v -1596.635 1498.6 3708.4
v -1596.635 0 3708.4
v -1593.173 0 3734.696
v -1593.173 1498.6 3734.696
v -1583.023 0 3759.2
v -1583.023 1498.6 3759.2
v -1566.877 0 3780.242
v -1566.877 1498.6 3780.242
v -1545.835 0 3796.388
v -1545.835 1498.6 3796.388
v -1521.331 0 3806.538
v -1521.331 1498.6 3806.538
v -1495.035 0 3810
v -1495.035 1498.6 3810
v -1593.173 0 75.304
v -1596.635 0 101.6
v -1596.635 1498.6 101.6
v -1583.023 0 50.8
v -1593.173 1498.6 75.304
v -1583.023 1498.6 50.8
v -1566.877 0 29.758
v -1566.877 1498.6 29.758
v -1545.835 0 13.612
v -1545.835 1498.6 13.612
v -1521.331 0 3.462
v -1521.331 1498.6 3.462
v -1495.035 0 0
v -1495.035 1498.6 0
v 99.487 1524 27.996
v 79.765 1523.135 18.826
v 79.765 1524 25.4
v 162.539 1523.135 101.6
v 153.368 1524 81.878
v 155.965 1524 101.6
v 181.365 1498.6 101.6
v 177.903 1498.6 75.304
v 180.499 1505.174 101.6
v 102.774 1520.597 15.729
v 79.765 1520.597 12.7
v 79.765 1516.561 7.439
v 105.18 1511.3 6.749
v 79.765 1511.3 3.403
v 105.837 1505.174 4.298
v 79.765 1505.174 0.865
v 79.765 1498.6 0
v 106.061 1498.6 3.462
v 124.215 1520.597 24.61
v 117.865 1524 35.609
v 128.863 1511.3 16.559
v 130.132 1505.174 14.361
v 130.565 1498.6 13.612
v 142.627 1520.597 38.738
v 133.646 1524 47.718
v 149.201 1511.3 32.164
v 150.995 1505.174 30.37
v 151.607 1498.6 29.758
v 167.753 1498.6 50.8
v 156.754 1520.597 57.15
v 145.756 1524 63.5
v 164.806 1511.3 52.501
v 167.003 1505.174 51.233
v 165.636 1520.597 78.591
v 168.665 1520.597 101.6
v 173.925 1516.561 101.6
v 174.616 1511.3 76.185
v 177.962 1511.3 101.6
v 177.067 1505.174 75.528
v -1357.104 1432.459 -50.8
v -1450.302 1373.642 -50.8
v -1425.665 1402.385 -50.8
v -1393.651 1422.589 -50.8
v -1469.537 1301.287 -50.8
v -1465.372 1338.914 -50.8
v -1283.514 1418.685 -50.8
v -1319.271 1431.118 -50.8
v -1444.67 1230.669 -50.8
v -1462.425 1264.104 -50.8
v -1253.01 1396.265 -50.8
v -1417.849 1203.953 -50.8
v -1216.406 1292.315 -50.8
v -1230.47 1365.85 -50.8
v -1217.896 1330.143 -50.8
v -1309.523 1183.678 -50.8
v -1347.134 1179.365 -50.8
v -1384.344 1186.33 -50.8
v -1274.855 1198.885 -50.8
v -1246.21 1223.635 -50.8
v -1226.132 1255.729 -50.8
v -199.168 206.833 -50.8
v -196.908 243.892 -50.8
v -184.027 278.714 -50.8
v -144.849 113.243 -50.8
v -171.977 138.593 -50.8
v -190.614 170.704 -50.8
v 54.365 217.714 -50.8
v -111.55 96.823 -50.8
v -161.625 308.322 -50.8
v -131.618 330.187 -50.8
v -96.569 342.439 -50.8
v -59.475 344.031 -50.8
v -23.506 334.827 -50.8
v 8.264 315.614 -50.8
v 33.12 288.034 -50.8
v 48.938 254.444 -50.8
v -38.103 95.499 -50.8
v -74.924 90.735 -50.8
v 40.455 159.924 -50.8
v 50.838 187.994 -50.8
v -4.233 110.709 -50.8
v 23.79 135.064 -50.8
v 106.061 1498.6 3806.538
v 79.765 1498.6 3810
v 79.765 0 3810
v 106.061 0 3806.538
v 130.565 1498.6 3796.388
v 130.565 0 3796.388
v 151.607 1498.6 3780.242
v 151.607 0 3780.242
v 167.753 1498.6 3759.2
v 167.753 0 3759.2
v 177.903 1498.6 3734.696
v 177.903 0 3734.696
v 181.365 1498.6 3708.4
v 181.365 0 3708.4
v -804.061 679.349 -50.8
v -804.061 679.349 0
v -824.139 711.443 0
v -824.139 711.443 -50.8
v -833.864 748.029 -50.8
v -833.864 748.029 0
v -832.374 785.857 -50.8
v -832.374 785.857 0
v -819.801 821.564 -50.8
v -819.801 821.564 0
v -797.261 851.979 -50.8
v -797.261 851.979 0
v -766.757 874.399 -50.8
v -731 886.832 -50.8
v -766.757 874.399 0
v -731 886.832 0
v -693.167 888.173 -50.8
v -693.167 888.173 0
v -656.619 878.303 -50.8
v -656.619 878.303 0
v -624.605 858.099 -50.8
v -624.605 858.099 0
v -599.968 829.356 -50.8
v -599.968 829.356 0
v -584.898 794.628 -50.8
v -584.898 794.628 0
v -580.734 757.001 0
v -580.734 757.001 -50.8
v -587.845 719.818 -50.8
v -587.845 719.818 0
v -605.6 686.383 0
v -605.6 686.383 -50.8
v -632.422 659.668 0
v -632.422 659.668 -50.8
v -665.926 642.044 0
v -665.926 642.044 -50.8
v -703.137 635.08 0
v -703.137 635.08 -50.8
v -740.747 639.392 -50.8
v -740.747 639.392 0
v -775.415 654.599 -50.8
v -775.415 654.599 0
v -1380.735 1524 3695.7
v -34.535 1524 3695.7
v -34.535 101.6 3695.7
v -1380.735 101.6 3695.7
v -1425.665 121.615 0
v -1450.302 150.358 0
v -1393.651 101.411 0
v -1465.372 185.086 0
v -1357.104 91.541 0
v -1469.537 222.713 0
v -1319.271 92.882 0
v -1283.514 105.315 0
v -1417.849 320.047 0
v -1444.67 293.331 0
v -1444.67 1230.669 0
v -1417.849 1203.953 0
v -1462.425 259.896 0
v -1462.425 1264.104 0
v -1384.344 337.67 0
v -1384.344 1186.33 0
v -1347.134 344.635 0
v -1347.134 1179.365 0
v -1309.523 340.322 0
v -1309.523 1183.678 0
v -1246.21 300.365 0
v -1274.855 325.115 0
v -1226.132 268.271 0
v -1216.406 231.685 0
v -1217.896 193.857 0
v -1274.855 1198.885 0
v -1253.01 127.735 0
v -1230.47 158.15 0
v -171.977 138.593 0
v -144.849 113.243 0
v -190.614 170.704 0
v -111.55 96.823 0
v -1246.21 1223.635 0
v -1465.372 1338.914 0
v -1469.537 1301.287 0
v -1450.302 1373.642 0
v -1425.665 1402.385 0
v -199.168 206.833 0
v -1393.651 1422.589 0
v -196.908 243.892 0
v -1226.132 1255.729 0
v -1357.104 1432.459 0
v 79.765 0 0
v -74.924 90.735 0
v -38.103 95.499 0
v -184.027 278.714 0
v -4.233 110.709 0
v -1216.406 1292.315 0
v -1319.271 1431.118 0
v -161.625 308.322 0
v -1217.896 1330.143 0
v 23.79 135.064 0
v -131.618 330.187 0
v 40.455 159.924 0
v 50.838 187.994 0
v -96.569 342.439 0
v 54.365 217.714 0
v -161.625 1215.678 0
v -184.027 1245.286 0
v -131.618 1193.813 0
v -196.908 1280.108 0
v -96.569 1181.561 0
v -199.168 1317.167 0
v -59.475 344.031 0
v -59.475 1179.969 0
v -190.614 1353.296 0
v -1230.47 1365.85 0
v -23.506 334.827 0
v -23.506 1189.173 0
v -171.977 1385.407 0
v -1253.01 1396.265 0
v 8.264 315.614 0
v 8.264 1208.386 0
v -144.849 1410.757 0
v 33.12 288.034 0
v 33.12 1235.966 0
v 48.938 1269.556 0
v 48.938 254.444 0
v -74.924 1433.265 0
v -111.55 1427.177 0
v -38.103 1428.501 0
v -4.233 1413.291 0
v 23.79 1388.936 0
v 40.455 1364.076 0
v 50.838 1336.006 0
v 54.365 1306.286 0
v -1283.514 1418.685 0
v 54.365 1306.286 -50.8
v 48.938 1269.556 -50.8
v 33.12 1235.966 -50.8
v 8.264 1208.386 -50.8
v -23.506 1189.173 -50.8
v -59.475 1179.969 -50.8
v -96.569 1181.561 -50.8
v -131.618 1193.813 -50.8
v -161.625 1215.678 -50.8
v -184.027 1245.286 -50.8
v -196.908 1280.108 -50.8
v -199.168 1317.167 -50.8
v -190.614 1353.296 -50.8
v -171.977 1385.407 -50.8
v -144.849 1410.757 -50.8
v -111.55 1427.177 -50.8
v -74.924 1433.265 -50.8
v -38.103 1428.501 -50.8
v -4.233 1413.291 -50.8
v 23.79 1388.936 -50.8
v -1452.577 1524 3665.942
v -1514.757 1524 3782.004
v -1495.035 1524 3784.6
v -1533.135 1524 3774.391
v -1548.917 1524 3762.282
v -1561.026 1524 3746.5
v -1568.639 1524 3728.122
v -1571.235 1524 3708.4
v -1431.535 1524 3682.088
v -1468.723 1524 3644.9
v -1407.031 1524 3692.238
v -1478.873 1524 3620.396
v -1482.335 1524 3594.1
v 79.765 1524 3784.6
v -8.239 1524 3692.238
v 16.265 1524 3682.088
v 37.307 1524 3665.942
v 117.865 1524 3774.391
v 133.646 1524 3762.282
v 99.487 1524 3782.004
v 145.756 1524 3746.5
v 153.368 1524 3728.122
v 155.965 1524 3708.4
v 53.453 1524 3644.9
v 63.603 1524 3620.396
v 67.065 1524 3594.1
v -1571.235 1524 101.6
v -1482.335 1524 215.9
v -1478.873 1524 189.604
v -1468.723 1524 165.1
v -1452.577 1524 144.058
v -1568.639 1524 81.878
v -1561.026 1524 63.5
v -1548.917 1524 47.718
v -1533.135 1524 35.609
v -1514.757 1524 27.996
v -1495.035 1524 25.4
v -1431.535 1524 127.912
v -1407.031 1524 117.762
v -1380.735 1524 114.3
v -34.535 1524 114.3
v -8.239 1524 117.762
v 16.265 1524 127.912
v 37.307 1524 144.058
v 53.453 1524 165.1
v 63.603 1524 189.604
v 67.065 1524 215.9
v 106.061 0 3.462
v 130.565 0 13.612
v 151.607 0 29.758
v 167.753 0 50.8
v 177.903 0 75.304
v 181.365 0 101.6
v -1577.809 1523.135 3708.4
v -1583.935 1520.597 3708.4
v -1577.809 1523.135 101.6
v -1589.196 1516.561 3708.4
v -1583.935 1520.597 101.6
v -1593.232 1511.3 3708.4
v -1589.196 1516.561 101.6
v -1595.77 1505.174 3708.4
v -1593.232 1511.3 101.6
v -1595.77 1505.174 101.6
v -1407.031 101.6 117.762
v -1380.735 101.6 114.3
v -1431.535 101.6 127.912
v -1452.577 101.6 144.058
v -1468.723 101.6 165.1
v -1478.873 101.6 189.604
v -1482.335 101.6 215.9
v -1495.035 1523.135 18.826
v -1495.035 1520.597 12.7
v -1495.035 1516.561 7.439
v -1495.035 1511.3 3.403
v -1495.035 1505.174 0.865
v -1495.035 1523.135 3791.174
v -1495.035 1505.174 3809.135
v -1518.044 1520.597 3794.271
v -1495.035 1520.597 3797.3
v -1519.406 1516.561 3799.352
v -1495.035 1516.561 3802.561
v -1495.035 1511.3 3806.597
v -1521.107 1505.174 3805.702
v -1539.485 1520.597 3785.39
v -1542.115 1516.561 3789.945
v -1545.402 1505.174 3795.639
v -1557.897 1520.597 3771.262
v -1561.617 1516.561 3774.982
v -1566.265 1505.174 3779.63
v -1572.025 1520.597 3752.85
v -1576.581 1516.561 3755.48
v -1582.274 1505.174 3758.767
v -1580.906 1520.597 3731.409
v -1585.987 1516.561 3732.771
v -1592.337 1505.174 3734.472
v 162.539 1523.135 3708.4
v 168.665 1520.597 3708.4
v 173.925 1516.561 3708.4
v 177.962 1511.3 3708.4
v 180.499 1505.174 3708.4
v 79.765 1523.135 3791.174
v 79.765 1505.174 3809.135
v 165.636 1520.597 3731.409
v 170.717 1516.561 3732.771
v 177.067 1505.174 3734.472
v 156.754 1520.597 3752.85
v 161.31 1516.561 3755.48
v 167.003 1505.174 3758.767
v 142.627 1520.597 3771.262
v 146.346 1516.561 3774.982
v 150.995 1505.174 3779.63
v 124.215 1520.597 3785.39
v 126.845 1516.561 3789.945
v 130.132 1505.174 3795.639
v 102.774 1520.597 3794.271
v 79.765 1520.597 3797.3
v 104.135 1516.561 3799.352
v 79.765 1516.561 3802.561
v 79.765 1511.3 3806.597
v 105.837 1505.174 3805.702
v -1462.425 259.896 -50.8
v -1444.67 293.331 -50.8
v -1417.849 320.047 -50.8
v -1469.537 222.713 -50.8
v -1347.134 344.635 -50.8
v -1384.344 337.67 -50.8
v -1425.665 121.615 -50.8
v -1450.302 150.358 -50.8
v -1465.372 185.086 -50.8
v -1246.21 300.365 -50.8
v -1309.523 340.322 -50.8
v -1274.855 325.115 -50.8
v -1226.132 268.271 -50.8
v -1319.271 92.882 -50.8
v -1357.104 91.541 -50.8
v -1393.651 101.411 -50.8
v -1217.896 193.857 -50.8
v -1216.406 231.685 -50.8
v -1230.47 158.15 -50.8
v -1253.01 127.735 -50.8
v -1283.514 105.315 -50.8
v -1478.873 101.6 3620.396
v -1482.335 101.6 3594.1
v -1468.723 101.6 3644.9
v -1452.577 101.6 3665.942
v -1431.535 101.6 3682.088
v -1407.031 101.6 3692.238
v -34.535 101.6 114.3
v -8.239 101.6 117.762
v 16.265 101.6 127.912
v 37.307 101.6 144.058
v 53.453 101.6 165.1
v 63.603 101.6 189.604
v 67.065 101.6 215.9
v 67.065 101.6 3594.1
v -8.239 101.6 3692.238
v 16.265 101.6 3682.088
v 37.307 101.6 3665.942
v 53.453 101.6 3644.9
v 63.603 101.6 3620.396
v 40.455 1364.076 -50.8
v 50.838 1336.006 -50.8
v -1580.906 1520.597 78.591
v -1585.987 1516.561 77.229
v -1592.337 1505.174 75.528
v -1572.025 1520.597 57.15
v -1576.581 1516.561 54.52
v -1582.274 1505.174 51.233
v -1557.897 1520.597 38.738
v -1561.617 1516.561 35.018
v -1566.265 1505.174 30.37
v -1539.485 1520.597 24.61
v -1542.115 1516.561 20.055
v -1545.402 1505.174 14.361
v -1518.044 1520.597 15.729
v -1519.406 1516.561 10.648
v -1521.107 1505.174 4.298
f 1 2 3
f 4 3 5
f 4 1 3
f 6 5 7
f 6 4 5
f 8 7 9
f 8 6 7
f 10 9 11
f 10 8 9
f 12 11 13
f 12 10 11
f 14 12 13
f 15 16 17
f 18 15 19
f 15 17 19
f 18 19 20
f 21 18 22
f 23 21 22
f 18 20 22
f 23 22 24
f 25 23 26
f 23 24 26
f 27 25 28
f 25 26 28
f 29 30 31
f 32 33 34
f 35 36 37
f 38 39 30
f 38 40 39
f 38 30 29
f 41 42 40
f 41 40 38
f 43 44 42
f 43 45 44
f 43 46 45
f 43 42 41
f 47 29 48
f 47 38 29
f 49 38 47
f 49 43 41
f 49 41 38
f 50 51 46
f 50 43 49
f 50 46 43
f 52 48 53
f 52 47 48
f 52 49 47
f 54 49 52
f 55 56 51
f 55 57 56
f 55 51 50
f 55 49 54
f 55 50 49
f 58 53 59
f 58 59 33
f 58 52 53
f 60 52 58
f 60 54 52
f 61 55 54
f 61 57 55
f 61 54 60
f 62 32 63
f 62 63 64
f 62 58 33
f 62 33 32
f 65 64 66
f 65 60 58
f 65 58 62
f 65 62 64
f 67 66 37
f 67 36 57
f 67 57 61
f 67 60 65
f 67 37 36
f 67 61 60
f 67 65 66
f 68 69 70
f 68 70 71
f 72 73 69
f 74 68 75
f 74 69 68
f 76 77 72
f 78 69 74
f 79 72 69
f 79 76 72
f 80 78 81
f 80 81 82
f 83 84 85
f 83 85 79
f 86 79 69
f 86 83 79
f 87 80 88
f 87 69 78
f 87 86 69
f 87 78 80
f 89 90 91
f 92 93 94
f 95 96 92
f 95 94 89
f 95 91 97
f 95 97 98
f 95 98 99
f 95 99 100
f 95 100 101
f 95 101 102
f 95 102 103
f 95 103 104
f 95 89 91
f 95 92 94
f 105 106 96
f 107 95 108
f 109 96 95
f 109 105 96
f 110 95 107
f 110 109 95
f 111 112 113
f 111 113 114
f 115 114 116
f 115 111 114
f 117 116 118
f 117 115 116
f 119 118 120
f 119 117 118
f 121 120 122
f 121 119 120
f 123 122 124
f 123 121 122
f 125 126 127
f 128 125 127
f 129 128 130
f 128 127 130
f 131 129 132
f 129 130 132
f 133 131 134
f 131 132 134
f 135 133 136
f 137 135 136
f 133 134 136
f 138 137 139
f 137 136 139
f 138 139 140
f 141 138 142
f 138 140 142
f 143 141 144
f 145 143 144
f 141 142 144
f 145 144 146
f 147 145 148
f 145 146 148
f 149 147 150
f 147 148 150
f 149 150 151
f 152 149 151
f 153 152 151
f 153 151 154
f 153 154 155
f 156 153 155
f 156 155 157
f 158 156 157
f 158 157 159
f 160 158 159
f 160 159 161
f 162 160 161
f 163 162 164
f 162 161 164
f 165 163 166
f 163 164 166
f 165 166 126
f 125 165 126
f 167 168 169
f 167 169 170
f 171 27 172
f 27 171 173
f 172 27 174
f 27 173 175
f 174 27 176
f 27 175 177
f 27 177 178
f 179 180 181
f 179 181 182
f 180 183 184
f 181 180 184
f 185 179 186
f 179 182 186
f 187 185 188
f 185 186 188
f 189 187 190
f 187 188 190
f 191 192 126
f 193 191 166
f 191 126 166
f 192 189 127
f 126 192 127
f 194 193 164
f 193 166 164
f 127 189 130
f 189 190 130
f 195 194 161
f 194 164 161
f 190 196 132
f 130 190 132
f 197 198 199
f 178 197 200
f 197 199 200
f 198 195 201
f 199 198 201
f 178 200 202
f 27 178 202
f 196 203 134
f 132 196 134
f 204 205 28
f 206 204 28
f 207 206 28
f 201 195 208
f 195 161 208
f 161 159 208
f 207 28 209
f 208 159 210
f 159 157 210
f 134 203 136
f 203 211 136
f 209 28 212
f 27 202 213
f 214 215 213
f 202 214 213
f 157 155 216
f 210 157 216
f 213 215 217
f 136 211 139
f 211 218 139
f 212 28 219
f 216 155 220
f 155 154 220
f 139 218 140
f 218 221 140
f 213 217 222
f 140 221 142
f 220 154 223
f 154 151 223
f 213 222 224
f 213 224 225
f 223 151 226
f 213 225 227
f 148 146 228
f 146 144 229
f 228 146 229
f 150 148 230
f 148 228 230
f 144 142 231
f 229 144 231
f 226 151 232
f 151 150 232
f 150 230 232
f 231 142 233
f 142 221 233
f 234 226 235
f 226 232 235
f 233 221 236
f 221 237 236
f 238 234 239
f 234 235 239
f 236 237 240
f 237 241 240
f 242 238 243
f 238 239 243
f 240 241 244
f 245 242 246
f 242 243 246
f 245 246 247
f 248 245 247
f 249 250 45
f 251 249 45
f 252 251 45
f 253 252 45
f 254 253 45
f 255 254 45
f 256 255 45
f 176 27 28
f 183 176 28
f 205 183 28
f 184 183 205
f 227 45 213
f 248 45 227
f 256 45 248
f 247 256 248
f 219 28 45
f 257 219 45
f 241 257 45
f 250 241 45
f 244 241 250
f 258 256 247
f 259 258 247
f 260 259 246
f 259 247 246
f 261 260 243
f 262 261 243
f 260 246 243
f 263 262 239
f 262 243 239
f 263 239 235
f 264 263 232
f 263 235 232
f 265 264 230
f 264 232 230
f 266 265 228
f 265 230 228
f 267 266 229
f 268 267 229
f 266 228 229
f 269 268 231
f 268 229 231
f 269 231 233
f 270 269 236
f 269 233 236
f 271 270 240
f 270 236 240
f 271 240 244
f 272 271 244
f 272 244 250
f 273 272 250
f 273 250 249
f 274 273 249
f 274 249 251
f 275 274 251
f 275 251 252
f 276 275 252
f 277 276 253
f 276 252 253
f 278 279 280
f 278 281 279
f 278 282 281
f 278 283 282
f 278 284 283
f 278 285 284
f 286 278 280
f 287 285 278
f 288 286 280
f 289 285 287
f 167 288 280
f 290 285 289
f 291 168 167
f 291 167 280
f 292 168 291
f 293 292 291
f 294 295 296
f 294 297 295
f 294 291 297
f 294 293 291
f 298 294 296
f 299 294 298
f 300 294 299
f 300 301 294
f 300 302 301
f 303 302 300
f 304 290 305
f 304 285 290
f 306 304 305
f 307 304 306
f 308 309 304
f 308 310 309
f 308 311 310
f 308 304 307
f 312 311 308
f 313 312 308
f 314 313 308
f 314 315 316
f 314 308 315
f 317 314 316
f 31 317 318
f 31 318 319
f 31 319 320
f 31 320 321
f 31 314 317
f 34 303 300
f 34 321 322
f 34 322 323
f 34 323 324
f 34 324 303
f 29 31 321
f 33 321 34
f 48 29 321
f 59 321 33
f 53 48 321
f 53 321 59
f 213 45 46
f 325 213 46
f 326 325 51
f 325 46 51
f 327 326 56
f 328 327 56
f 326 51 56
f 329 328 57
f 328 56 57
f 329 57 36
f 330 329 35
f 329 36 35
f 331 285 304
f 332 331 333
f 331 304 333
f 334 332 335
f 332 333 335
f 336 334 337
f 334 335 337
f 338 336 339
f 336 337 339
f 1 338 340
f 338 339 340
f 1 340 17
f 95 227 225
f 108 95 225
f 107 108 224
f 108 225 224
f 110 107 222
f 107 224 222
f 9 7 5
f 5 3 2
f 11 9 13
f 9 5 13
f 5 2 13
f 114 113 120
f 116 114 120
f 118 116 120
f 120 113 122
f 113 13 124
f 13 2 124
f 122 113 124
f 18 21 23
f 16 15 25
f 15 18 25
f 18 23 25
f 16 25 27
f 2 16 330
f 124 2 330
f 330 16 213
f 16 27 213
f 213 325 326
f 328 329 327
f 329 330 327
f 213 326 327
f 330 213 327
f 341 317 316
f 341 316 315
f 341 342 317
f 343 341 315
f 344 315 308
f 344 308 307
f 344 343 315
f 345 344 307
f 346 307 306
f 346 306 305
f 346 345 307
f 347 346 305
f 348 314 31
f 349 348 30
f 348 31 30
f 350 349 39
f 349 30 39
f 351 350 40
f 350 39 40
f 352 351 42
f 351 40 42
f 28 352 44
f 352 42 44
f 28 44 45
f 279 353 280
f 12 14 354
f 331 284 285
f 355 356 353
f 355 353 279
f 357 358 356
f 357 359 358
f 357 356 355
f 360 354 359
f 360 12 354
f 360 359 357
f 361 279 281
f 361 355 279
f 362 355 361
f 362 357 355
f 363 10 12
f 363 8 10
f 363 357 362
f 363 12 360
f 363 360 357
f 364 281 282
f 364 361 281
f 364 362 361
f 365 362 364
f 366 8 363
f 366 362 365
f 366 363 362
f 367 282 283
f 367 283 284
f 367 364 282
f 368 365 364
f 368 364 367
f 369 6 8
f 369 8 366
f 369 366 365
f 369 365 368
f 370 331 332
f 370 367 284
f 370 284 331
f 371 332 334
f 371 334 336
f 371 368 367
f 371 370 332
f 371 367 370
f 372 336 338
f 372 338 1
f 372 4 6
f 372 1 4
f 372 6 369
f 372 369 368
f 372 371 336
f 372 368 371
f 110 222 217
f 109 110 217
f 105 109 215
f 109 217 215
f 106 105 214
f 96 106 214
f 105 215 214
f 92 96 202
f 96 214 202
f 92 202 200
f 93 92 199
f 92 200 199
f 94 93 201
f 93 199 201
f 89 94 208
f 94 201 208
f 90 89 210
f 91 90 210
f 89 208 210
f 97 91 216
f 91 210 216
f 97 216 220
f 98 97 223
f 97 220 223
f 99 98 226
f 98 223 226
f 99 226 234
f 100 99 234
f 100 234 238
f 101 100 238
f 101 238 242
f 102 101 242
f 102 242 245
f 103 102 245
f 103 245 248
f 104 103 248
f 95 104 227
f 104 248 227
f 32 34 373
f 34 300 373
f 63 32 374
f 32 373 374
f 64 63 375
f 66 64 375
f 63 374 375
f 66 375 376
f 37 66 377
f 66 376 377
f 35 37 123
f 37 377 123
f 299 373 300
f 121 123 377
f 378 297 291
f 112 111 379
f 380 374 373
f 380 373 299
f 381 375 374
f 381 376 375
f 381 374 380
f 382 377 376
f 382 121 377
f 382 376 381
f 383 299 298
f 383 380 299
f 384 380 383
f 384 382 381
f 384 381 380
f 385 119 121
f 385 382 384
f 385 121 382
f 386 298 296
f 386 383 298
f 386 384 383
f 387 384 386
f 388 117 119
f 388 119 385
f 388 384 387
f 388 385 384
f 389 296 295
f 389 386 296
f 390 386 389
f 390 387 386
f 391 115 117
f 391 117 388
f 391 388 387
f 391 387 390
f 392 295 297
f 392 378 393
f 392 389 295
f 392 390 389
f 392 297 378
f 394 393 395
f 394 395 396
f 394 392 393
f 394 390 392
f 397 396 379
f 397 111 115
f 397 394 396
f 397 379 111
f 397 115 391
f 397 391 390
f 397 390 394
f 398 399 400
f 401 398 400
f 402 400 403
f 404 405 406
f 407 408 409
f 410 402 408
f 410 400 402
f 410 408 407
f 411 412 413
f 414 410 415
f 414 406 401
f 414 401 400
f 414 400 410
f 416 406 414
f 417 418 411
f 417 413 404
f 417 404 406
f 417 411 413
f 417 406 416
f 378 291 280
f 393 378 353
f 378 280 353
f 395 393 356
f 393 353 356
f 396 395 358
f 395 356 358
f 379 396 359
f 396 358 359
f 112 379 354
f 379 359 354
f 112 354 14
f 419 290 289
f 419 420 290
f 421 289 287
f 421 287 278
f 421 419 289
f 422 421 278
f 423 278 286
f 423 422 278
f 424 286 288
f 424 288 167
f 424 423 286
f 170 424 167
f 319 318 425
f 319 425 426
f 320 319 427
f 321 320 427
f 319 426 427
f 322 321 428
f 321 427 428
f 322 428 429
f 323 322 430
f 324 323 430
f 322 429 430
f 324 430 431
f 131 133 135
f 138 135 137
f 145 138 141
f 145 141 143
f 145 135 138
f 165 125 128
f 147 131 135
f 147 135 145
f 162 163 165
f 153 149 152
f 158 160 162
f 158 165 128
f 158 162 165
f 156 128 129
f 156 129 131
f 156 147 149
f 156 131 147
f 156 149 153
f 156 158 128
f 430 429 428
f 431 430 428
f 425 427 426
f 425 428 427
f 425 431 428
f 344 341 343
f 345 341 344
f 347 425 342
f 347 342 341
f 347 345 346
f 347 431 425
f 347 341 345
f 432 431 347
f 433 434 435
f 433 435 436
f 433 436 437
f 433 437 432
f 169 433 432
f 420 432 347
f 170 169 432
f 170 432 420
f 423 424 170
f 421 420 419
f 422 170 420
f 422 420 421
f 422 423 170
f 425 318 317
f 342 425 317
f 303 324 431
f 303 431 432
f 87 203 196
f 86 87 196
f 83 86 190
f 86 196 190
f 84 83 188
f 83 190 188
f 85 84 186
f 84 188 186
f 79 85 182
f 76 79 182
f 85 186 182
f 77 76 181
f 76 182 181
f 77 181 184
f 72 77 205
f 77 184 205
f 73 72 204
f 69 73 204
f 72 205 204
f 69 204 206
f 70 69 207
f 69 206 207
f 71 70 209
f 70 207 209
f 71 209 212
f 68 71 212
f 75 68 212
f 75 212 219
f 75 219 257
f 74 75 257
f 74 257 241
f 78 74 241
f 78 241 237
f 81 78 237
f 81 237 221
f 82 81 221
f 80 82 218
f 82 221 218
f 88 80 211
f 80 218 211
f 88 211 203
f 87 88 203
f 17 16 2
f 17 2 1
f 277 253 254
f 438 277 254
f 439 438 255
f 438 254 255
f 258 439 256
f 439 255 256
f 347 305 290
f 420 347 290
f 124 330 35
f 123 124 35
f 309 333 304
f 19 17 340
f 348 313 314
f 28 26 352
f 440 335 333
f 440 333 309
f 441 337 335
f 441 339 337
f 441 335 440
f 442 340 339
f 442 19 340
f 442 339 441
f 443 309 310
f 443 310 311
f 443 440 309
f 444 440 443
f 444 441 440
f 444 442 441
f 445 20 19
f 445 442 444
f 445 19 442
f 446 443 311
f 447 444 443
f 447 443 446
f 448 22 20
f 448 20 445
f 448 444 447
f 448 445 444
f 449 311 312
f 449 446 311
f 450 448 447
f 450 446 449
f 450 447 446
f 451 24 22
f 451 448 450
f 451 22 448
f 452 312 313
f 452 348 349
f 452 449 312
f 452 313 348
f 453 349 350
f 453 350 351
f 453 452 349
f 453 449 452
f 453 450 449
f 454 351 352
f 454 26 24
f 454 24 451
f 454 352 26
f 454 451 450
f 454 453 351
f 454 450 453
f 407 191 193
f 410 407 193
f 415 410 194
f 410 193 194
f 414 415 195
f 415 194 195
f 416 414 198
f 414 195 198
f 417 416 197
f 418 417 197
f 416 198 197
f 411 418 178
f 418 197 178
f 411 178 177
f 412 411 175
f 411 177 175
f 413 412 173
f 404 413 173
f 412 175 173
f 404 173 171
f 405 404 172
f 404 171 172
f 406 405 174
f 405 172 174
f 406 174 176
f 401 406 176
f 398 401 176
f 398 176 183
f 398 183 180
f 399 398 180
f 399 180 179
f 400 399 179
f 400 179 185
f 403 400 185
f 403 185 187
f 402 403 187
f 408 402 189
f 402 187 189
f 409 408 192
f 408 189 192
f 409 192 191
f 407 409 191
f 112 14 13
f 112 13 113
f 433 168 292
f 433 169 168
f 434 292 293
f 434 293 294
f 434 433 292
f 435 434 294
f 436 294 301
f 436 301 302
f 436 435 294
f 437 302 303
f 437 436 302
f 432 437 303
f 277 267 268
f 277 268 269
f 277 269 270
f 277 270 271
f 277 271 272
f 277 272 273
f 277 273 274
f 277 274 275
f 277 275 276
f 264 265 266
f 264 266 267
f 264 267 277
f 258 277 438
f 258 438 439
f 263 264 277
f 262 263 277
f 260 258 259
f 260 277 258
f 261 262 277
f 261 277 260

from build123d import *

# Parameters (mm, degrees)
F0_W     = 1778
F0_H     = 1524
F1_DEPTH = 3810
F2_W     = 1549.4000046253
F2_H     = 3581.4000046253
F3_DEPTH = 1422.4
F5_DEPTH = 50.8
F6_R     = 101.6
F7_R     = 25.4


with BuildPart() as f1:
    # F0 (on Top) → F1 (new body)
    with BuildSketch(Plane.XY):
        with Locations((-707.6352133521, 762)):
            Rectangle(F0_W, F0_H)
    extrude(amount=F1_DEPTH)

    # F2 (on face) → F3 (cut)
    with BuildSketch(Plane(origin=(0, 1524, 0), x_dir=(-1, 0, 0), z_dir=(0, 1, 0))):
        with Locations((707.6352133521, 1905)):
            Rectangle(F2_W, F2_H)
    extrude(amount=-F3_DEPTH, mode=Mode.SUBTRACT)

    # F4 (on face) → F5 (join)
    with BuildSketch(Plane(origin=(0, 0, 0), x_dir=(1, 0, 0), z_dir=(0, 0, -1))):
        with BuildLine():
            Line((-611.2096248517, -844.6505044289), (-707.6352133521, -762))
            Line((-707.6352133521, -762), (-804.0608018525, -844.6505044289))
            ThreePointArc((-804.0608018525, -844.6505044289), (-707.6352133521, -889), (-611.2096248517, -844.6505044289))
        make_face()
        with BuildLine():
            Line((-611.2096248517, -679.3494955711), (-707.6352133521, -762))
            Line((-707.6352133521, -762), (-611.2096248517, -844.6505044289))
            ThreePointArc((-611.2096248517, -844.6505044289), (-588.5238164592, -806.0621734623), (-580.6352133521, -762))
            ThreePointArc((-580.6352133521, -762), (-588.5238164592, -717.9378265377), (-611.2096248517, -679.3494955711))
        make_face()
        with BuildLine():
            ThreePointArc((-611.2096248517, -679.3494955711), (-707.6352133521, -635), (-804.0608018525, -679.3494955711))
            Line((-804.0608018525, -679.3494955711), (-707.6352133521, -762))
            Line((-707.6352133521, -762), (-611.2096248517, -679.3494955711))
        make_face()
        with BuildLine():
            Line((-707.6352133521, -762), (-804.0608018525, -679.3494955711))
            ThreePointArc((-804.0608018525, -679.3494955711), (-834.6352133521, -762), (-804.0608018525, -844.6505044289))
            Line((-804.0608018525, -844.6505044289), (-707.6352133521, -762))
        make_face()
        with BuildLine():
            Line((-1246.2096248517, -300.3647901432), (-1439.0608018525, -135.0637812854))
            ThreePointArc((-1439.0608018525, -135.0637812854), (-1425.285717781, -314.1398742147), (-1246.2096248517, -300.3647901432))
        make_face()
        with BuildLine():
            ThreePointArc((-1215.6352133521, -217.7142857143), (-1298.5730398898, -98.6028888214), (-1439.0608018525, -135.0637812854))
            Line((-1439.0608018525, -135.0637812854), (-1246.2096248517, -300.3647901432))
            ThreePointArc((-1246.2096248517, -300.3647901432), (-1223.5238164592, -261.7764591766), (-1215.6352133521, -217.7142857143))
        make_face()
        with BuildLine():
            ThreePointArc((54.3647866479, -217.7142857143), (46.4761835408, -173.6521122519), (23.7903751483, -135.0637812854))
            Line((23.7903751483, -135.0637812854), (-169.0608018525, -300.3647901432))
            ThreePointArc((-169.0608018525, -300.3647901432), (-28.5730398898, -336.8256826072), (54.3647866479, -217.7142857143))
        make_face()
        with BuildLine():
            Line((-169.0608018525, -300.3647901432), (23.7903751483, -135.0637812854))
            ThreePointArc((23.7903751483, -135.0637812854), (-155.285717781, -121.2886972139), (-169.0608018525, -300.3647901432))
        make_face()
        with BuildLine():
            Line((-169.0608018525, -1223.6352098568), (23.7903751483, -1388.9362187146))
            ThreePointArc((23.7903751483, -1388.9362187146), (46.4761835408, -1350.3478877481), (54.3647866479, -1306.2857142857))
            ThreePointArc((54.3647866479, -1306.2857142857), (-28.5730398898, -1187.1743173928), (-169.0608018525, -1223.6352098568))
        make_face()
        with BuildLine():
            ThreePointArc((-169.0608018525, -1223.6352098568), (-155.285717781, -1402.7113027861), (23.7903751483, -1388.9362187146))
            Line((23.7903751483, -1388.9362187146), (-169.0608018525, -1223.6352098568))
        make_face()
        with BuildLine():
            Line((-1246.2096248517, -1223.6352098568), (-1439.0608018525, -1388.9362187146))
            ThreePointArc((-1439.0608018525, -1388.9362187146), (-1298.5730398898, -1425.3971111786), (-1215.6352133521, -1306.2857142857))
            ThreePointArc((-1215.6352133521, -1306.2857142857), (-1223.5238164592, -1262.2235408234), (-1246.2096248517, -1223.6352098568))
        make_face()
        with BuildLine():
            ThreePointArc((-1246.2096248517, -1223.6352098568), (-1425.285717781, -1209.8601257853), (-1439.0608018525, -1388.9362187146))
            Line((-1439.0608018525, -1388.9362187146), (-1246.2096248517, -1223.6352098568))
        make_face()
    extrude(amount=F5_DEPTH)

    # F6
    f6_edges = [f1.edges().sort_by_distance(p)[0] for p in [
        (181.364787, 762, 0),
        (-1596.635213, 762, 0),
        (181.364787, 762, 3810),
        (-1596.635213, 762, 3810),
        (67.064789, 812.8, 3695.700002),
        (-1482.335216, 812.8, 3695.700002),
        (-1482.335216, 812.8, 114.299998),
        (67.064789, 812.8, 114.299998),
    ]]
    fillet(f6_edges, radius=F6_R)

    # F7
    f7_edges = [f1.edges().sort_by_distance(p)[0] for p in [
        (181.364787, 1524, 1905),
    ]]
    fillet(f7_edges, radius=F7_R)


solid = f1.part
